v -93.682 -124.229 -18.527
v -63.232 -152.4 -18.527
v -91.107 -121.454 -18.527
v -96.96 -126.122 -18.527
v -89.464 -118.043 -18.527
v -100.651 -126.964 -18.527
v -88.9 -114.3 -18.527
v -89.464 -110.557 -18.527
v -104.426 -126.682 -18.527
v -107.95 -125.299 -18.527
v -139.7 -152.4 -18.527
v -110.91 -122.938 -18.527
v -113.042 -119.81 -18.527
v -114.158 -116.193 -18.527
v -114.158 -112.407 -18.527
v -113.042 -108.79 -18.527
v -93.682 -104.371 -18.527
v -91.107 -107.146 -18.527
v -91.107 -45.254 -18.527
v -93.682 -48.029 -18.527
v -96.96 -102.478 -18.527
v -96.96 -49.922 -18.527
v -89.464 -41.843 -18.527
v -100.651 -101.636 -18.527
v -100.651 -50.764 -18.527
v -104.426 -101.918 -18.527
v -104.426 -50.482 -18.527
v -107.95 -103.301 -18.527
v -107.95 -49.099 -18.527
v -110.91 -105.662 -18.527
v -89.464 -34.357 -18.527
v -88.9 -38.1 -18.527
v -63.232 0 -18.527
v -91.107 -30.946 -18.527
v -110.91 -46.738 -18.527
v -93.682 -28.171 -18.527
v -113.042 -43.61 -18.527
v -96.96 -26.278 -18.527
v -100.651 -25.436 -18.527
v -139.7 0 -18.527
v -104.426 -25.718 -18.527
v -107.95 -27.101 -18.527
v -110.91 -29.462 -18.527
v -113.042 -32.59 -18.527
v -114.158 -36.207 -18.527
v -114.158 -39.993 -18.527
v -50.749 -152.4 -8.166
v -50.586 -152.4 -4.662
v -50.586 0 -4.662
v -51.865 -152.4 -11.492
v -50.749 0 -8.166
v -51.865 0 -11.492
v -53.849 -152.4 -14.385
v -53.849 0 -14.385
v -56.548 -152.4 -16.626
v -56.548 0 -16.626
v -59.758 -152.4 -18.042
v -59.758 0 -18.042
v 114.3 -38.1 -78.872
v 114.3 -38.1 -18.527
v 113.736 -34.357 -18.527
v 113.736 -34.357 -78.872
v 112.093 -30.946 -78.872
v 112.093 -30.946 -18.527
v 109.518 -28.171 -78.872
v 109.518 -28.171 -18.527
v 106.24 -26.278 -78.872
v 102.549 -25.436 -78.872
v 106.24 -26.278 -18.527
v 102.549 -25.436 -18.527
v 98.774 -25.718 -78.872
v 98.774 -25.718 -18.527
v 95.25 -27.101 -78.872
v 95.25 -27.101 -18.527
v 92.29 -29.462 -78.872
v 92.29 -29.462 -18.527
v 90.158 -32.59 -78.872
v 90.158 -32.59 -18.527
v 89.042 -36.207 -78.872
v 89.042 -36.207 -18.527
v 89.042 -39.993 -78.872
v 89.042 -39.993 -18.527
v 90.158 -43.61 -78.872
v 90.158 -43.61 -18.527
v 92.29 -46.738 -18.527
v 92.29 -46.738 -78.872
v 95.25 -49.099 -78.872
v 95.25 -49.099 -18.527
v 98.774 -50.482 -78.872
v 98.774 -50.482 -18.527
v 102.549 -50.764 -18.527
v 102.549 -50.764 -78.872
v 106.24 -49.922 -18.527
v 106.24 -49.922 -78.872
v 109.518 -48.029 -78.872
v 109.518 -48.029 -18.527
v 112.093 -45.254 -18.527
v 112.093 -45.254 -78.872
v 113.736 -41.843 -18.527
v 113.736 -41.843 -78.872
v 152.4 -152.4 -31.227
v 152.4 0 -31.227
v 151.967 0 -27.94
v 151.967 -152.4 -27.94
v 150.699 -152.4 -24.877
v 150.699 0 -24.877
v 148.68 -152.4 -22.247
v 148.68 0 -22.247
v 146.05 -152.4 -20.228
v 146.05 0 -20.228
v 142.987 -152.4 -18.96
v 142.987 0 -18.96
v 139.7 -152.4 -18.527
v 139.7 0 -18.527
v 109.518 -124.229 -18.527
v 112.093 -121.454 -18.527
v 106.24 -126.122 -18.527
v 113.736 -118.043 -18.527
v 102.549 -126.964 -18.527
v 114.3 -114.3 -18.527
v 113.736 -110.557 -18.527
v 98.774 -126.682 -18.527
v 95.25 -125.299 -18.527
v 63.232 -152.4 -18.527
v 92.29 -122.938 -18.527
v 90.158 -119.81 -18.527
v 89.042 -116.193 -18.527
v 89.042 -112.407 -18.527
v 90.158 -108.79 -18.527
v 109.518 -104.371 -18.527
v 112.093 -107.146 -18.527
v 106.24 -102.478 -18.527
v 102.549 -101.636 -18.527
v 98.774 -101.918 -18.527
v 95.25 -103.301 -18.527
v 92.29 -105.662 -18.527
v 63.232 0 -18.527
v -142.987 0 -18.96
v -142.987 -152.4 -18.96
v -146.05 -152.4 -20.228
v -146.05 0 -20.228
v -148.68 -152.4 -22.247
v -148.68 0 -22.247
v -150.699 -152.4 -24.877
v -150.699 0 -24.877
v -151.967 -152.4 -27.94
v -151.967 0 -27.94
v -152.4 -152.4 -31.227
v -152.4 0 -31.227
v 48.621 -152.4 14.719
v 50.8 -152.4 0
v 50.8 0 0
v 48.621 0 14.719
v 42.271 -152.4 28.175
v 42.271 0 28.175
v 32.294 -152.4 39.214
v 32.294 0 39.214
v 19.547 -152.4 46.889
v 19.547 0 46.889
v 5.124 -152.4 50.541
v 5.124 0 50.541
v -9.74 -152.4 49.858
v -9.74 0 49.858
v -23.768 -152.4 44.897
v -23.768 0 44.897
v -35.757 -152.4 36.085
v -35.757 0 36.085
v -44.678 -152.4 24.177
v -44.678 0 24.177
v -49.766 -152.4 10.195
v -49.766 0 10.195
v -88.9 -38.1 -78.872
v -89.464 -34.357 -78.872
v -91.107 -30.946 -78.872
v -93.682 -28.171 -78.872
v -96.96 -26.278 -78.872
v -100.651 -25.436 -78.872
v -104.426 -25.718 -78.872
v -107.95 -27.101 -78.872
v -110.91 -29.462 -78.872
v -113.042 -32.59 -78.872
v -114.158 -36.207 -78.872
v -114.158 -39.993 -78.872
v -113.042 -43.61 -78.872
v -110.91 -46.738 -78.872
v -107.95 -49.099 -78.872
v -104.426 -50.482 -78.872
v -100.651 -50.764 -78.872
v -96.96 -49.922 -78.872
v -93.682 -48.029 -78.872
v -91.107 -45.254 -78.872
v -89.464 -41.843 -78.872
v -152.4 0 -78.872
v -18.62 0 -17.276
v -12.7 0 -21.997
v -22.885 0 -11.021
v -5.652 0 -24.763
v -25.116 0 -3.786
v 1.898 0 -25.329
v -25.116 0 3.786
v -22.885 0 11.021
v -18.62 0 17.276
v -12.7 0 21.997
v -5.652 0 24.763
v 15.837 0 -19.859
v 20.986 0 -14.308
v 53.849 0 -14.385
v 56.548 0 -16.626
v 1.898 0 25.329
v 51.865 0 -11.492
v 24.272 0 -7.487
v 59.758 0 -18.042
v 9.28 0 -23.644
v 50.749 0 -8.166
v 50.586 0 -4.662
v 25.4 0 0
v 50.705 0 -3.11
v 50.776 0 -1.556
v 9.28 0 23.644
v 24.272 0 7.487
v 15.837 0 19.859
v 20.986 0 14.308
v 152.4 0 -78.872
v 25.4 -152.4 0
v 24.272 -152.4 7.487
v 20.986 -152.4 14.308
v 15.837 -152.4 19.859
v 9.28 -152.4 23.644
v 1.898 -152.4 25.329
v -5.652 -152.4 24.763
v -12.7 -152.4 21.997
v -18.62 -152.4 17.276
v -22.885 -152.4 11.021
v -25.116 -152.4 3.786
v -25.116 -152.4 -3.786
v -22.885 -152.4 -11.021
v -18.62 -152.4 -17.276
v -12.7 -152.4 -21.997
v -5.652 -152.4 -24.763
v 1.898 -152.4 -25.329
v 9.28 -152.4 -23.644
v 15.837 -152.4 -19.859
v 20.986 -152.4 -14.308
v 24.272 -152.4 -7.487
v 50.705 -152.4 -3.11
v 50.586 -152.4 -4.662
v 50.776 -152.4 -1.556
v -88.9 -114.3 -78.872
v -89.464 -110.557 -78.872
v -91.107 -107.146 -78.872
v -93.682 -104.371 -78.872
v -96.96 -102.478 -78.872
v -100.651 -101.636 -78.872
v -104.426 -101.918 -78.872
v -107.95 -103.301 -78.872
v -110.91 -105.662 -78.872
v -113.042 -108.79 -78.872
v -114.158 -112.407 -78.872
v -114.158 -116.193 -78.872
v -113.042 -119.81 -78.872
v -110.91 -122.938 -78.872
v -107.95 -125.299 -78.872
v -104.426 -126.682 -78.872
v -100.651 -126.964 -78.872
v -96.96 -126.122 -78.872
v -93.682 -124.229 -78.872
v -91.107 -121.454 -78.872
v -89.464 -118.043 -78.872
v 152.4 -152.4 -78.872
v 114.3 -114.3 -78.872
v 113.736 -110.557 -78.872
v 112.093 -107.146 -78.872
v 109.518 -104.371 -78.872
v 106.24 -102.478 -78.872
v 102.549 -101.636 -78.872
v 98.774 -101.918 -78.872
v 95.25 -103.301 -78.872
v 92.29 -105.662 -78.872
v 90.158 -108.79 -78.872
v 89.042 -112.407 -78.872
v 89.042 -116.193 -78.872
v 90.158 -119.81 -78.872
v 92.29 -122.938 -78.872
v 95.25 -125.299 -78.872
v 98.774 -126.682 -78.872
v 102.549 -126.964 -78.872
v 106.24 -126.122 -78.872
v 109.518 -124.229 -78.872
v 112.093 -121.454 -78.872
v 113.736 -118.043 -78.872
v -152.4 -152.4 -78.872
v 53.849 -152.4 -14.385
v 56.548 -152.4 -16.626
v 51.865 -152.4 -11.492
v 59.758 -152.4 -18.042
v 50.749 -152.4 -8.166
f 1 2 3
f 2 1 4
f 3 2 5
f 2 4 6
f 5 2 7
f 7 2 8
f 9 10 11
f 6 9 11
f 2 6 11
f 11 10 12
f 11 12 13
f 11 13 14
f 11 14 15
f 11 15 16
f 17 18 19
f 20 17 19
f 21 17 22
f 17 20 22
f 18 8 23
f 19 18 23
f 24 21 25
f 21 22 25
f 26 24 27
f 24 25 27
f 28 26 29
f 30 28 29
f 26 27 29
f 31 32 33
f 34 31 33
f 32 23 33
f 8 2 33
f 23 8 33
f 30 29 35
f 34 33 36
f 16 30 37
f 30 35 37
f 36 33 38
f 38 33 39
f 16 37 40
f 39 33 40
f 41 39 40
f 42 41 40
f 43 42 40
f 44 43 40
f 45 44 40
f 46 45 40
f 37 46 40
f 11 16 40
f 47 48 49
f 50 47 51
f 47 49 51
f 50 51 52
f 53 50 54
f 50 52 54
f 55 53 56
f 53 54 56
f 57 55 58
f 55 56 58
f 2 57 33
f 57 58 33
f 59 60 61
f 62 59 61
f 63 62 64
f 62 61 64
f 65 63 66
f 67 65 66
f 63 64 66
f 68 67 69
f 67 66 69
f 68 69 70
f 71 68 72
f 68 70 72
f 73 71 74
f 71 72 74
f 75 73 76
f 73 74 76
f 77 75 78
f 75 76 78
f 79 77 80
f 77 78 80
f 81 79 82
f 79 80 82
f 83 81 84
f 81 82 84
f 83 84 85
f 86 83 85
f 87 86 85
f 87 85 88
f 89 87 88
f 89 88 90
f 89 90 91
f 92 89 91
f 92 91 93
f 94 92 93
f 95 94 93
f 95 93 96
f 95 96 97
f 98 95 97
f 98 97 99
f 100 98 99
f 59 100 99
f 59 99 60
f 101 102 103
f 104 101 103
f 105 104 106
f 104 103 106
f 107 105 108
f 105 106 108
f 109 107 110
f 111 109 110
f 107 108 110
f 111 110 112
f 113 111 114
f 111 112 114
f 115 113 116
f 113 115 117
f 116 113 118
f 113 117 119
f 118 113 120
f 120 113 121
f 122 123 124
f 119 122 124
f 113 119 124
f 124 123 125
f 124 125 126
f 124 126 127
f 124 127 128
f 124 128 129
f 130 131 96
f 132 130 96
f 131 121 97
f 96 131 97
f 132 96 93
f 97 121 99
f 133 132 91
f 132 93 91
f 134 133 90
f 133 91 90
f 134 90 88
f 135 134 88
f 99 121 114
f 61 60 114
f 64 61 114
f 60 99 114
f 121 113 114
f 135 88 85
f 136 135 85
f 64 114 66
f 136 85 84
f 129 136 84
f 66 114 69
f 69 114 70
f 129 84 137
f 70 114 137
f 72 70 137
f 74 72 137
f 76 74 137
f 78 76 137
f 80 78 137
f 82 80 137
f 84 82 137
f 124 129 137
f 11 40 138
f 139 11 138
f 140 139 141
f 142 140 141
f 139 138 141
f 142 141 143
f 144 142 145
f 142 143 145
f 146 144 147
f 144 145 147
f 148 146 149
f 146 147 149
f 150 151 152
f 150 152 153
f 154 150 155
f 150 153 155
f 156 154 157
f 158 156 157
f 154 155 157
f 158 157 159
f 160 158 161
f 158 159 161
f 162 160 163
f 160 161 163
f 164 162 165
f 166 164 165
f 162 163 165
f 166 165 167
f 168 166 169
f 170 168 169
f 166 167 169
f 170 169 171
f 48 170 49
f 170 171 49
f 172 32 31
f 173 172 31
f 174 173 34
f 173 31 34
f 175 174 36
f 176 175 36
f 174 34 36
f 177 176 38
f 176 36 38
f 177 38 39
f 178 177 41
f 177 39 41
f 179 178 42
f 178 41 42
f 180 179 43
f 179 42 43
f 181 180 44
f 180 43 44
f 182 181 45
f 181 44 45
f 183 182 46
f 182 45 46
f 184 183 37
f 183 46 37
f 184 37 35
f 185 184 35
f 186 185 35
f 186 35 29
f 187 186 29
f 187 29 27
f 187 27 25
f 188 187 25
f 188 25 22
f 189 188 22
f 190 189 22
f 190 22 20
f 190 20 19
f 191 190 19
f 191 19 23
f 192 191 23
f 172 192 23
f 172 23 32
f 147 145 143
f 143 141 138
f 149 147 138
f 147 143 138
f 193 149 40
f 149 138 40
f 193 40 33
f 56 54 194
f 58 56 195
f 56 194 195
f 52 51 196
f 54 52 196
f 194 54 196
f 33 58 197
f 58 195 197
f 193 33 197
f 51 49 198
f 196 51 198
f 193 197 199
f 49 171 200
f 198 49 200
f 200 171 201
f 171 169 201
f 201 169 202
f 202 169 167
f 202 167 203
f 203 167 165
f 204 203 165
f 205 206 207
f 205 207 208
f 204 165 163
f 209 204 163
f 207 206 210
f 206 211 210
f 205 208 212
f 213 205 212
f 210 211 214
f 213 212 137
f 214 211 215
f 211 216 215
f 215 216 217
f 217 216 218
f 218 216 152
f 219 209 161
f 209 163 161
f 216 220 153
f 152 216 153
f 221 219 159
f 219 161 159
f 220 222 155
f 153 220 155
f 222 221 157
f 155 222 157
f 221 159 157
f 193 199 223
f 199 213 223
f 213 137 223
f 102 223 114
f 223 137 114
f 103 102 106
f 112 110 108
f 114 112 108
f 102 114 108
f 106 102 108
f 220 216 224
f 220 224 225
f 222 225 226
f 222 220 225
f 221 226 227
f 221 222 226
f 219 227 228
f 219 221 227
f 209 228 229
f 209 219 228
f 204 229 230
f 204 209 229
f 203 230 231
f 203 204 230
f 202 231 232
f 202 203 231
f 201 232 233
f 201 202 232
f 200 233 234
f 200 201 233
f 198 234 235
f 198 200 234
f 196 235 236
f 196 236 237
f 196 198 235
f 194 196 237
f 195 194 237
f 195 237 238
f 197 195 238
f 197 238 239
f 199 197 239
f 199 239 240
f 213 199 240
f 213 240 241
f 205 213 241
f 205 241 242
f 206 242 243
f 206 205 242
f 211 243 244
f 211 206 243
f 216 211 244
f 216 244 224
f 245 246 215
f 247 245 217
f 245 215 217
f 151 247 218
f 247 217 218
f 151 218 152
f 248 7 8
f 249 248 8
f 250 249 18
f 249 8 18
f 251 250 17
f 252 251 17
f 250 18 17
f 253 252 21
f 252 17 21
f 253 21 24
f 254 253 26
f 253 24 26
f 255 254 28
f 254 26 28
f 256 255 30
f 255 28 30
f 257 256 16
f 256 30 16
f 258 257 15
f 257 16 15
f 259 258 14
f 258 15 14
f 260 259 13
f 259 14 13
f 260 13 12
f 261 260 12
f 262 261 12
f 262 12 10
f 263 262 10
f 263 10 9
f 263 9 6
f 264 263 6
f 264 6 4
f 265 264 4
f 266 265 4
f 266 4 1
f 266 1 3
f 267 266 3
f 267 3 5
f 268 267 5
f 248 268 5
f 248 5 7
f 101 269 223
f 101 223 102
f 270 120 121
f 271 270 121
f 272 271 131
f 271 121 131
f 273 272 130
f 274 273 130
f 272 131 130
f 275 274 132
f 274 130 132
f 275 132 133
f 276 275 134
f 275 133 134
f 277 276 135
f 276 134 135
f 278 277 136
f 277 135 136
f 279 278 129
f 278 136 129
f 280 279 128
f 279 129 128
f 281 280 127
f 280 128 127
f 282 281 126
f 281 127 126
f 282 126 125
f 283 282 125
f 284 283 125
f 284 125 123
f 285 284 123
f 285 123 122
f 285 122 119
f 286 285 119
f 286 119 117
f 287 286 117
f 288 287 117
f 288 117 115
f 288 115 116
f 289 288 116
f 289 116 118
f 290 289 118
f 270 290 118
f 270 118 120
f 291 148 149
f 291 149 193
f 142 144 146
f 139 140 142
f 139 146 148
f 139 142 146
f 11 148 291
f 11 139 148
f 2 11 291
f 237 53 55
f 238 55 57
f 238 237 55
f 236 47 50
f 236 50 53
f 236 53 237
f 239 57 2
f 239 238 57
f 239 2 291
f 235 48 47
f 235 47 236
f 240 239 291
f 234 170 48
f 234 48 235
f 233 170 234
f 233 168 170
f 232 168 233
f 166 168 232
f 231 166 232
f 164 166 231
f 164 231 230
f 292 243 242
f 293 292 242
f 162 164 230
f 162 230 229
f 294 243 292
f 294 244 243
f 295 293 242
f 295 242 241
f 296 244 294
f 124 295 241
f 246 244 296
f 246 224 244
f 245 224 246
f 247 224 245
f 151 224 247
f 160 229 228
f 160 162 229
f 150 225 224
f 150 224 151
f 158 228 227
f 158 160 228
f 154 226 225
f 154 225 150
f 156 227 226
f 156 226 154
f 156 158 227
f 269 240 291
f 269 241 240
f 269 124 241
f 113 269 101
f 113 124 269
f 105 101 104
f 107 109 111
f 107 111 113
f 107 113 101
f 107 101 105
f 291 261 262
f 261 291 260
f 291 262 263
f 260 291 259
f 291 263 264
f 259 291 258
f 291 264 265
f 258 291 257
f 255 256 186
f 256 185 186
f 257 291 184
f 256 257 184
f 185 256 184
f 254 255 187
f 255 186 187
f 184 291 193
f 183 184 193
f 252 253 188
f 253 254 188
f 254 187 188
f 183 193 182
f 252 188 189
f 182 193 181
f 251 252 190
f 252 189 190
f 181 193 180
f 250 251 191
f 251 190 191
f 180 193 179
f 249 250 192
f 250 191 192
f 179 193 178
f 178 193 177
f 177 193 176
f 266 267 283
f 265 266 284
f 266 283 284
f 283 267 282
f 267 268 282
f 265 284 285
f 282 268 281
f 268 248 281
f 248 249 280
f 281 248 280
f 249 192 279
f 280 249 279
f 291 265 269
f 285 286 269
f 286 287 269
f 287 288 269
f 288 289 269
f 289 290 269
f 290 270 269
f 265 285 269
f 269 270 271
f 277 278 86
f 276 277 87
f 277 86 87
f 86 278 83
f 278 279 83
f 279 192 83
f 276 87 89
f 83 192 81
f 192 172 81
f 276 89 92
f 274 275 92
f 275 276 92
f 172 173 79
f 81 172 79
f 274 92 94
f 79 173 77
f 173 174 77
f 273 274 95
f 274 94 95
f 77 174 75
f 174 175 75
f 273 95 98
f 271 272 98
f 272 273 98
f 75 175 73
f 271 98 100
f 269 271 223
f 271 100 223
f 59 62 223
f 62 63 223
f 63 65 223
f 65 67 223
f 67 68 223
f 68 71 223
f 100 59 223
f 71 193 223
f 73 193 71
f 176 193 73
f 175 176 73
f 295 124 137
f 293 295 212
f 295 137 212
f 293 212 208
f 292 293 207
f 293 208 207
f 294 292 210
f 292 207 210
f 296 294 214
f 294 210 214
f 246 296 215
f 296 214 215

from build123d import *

# Parameters (mm, degrees)
F0_R     = 25.4
F1_DEPTH = 152.4
F2_R     = 12.7
F3_DEPTH = 60.345965


with BuildPart() as f1:
    # F0 (on Front) → F1 (new body)
    with BuildSketch(Plane.XZ):
        with BuildLine():
            ThreePointArc((-50.585668, -4.661564), (-53.848843, -14.385271), (-63.232085, -18.526955))
            Line((-63.232085, -18.526955), (-139.7, -18.526955))
            ThreePointArc((-139.7, -18.526955), (-148.680256, -22.246699), (-152.4, -31.226955))
            Line((-152.4, -31.226955), (-152.4, -78.871921))
            Line((-152.4, -78.871921), (152.4, -78.871921))
            Line((152.4, -78.871921), (152.4, -31.226955))
            ThreePointArc((152.4, -31.226955), (148.680256, -22.246699), (139.7, -18.526955))
            Line((139.7, -18.526955), (63.232085, -18.526955))
            ThreePointArc((63.232085, -18.526955), (53.848843, -14.385271), (50.585668, -4.661564))
            ThreePointArc((50.585668, -4.661564), (0, -50.8), (-50.585668, -4.661564))
        make_face()
        with BuildLine():
            ThreePointArc((50.8, 0), (-2.333245, 50.746389), (-50.585668, -4.661564))
            ThreePointArc((-50.585668, -4.661564), (0, -50.8), (50.585668, -4.661564))
            ThreePointArc((50.585668, -4.661564), (50.746389, -2.333245), (50.8, 0))
        make_face()
        Circle(F0_R, mode=Mode.SUBTRACT)
    extrude(amount=F1_DEPTH)

    # F2 (on face) → F3 (cut, through all)
    with BuildSketch(Plane.XY.offset(-18.526955)):
        with Locations((-101.6, -38.1)):
            Circle(F2_R)
        with Locations((-101.6, -114.3)):
            Circle(F2_R)
        with Locations((101.6, -114.3)):
            Circle(F2_R)
        with Locations((101.6, -38.1)):
            Circle(F2_R)
    extrude(amount=-F3_DEPTH, mode=Mode.SUBTRACT)


solid = f1.part
